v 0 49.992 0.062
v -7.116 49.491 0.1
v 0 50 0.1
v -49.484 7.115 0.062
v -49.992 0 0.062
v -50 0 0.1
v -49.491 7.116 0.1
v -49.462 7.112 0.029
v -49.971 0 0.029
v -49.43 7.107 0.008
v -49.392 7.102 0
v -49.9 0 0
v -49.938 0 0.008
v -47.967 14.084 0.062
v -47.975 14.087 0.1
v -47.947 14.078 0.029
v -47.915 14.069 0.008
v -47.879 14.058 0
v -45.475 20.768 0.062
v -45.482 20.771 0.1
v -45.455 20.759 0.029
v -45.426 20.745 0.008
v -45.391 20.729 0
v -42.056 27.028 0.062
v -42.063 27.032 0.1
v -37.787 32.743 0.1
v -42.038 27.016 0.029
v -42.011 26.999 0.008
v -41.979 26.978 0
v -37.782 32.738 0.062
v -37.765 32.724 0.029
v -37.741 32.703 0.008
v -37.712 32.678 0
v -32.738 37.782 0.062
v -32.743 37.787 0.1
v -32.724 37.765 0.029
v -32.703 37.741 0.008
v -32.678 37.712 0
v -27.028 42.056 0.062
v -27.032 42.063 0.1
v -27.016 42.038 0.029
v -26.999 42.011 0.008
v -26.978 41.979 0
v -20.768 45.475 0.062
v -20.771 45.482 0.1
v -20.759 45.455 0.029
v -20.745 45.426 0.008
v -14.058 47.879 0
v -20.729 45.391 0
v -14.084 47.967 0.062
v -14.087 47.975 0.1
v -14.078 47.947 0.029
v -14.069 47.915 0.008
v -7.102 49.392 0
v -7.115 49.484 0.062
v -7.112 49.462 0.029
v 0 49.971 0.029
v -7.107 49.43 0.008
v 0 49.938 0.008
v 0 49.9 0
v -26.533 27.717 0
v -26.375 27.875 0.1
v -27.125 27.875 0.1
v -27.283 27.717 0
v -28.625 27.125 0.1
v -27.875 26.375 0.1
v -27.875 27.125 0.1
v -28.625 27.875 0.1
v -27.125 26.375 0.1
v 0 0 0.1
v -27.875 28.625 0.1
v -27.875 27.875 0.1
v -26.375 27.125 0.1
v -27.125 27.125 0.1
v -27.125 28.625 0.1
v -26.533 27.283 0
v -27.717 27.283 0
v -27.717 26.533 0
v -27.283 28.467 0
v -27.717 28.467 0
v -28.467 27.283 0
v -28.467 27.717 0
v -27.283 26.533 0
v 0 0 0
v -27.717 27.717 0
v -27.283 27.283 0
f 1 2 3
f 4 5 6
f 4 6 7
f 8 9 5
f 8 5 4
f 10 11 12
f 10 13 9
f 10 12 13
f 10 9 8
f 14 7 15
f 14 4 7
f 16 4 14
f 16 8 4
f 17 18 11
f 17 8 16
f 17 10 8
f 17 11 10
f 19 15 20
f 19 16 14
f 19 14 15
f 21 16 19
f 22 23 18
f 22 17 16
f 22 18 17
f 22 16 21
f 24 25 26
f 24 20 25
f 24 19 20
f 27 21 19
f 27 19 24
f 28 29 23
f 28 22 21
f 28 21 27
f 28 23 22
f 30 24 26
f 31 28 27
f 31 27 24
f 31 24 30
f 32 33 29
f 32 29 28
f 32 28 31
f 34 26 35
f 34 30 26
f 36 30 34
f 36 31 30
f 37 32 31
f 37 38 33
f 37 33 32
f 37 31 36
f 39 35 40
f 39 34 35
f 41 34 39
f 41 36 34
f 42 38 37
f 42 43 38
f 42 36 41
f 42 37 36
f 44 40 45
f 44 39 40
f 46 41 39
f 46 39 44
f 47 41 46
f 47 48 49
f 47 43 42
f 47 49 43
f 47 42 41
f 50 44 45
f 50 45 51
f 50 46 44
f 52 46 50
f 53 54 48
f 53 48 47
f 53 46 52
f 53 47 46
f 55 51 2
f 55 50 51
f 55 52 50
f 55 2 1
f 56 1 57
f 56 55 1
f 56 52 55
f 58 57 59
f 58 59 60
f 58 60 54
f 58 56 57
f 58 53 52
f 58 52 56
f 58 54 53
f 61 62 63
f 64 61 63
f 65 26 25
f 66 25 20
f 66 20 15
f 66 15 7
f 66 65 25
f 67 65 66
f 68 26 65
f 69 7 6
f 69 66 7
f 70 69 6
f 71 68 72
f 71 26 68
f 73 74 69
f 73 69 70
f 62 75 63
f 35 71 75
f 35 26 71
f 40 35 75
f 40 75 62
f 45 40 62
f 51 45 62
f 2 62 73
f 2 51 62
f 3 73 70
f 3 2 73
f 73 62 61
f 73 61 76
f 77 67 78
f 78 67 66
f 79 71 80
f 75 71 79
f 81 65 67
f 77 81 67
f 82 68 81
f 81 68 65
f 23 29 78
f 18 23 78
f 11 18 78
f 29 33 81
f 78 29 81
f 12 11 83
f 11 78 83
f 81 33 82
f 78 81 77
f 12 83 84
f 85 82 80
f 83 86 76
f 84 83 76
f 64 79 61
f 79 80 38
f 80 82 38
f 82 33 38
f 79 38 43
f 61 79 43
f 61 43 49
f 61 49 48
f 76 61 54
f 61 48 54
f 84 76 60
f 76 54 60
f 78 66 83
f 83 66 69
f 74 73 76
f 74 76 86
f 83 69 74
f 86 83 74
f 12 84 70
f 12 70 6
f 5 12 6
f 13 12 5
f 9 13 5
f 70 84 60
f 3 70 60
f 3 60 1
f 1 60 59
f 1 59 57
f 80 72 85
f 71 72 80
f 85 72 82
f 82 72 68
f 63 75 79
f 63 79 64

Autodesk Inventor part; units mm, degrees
ref_plane "YZ Plane" through (0, 0, 0) normal (1, 0, 0) x (0, 1, 0)
ref_plane "XZ Plane" through (0, 0, 0) normal (0, 1, 0) x (-1, 0, 0)
ref_plane "XY Plane" through (0, 0, 0) normal (0, 0, 1) x (1, 0, 0)
sketch "Sketch1" plane through (0, 0, 0) normal (0, 0, 1) x (1, 0, 0)
  line L0 (0, 0) -> (-50, 0)
  line L1 (0, 0) -> (0, 50)
  arc A0 (0, 50) -> (-50, 0) centre (0, 0) ccw
  dimension "d0" = 50
extrude "Wafer" add sketch "Sketch1" along normal blind 0.1
fillet "OuterEdge" radius 0.1 1 edges at (-35.3553, 35.3553, 0)
sketch "DeepEtchSketch" plane through (0, 0, 0.1) normal (0, 0, 1) x (1, 0, 0)
  line L0 (0, 0) -> (-50, 0) projected
  line L1 (0, 50) -> (0, 0) projected
  line L2 (-25, 25) -> (-15, 25) construction
  line L3 (-15, 25) -> (-15, 15) construction
  line L4 (-15, 15) -> (-25, 15) construction
  line L5 (-25, 15) -> (-25, 25) construction
  line L6 (-25, 20) -> (-15, 20) construction
  line L7 (-20, 25) -> (-20, 15) construction
  line L8 (-27.875, 27.875) -> (-27.125, 27.875) construction
  line L9 (-27.125, 27.875) -> (-27.125, 27.125) construction
  line L10 (-27.125, 27.125) -> (-27.875, 27.125) construction
  line L11 (-27.875, 27.125) -> (-27.875, 27.875) construction
  line L12 (-27.875, 27.875) -> (-28.625, 27.875)
  line L13 (-28.625, 27.875) -> (-28.625, 27.125)
  line L14 (-28.625, 27.125) -> (-27.875, 27.125)
  line L15 (-27.875, 27.125) -> (-27.875, 26.375)
  line L16 (-27.875, 26.375) -> (-27.125, 26.375)
  line L17 (-27.125, 26.375) -> (-27.125, 27.125)
  line L18 (-27.875, 27.875) -> (-27.875, 28.625)
  line L19 (-27.875, 28.625) -> (-27.125, 28.625)
  line L20 (-27.125, 28.625) -> (-27.125, 27.875)
  line L21 (-26.375, 27.875) -> (-27.125, 27.875)
  line L22 (-26.375, 27.875) -> (-26.375, 27.125)
  line L23 (-26.375, 27.125) -> (-27.125, 27.125)
  line L24 (-27.875, 27.5) -> (-27.125, 27.5) construction
  line L25 (-27.5, 27.875) -> (-27.5, 27.125) construction
  dimension "d4" = 20
  dimension "d5" = 20
  dimension "d6" = 10
  dimension "d7" = 0.75
  dimension "d12" = 2.5
  dimension "d13" = 2.5
extrude "ThroughWaferEtch" cut sketch "DeepEtchSketch" against normal blind 0.1 draft -57.6
properties part number "top-wafer"
